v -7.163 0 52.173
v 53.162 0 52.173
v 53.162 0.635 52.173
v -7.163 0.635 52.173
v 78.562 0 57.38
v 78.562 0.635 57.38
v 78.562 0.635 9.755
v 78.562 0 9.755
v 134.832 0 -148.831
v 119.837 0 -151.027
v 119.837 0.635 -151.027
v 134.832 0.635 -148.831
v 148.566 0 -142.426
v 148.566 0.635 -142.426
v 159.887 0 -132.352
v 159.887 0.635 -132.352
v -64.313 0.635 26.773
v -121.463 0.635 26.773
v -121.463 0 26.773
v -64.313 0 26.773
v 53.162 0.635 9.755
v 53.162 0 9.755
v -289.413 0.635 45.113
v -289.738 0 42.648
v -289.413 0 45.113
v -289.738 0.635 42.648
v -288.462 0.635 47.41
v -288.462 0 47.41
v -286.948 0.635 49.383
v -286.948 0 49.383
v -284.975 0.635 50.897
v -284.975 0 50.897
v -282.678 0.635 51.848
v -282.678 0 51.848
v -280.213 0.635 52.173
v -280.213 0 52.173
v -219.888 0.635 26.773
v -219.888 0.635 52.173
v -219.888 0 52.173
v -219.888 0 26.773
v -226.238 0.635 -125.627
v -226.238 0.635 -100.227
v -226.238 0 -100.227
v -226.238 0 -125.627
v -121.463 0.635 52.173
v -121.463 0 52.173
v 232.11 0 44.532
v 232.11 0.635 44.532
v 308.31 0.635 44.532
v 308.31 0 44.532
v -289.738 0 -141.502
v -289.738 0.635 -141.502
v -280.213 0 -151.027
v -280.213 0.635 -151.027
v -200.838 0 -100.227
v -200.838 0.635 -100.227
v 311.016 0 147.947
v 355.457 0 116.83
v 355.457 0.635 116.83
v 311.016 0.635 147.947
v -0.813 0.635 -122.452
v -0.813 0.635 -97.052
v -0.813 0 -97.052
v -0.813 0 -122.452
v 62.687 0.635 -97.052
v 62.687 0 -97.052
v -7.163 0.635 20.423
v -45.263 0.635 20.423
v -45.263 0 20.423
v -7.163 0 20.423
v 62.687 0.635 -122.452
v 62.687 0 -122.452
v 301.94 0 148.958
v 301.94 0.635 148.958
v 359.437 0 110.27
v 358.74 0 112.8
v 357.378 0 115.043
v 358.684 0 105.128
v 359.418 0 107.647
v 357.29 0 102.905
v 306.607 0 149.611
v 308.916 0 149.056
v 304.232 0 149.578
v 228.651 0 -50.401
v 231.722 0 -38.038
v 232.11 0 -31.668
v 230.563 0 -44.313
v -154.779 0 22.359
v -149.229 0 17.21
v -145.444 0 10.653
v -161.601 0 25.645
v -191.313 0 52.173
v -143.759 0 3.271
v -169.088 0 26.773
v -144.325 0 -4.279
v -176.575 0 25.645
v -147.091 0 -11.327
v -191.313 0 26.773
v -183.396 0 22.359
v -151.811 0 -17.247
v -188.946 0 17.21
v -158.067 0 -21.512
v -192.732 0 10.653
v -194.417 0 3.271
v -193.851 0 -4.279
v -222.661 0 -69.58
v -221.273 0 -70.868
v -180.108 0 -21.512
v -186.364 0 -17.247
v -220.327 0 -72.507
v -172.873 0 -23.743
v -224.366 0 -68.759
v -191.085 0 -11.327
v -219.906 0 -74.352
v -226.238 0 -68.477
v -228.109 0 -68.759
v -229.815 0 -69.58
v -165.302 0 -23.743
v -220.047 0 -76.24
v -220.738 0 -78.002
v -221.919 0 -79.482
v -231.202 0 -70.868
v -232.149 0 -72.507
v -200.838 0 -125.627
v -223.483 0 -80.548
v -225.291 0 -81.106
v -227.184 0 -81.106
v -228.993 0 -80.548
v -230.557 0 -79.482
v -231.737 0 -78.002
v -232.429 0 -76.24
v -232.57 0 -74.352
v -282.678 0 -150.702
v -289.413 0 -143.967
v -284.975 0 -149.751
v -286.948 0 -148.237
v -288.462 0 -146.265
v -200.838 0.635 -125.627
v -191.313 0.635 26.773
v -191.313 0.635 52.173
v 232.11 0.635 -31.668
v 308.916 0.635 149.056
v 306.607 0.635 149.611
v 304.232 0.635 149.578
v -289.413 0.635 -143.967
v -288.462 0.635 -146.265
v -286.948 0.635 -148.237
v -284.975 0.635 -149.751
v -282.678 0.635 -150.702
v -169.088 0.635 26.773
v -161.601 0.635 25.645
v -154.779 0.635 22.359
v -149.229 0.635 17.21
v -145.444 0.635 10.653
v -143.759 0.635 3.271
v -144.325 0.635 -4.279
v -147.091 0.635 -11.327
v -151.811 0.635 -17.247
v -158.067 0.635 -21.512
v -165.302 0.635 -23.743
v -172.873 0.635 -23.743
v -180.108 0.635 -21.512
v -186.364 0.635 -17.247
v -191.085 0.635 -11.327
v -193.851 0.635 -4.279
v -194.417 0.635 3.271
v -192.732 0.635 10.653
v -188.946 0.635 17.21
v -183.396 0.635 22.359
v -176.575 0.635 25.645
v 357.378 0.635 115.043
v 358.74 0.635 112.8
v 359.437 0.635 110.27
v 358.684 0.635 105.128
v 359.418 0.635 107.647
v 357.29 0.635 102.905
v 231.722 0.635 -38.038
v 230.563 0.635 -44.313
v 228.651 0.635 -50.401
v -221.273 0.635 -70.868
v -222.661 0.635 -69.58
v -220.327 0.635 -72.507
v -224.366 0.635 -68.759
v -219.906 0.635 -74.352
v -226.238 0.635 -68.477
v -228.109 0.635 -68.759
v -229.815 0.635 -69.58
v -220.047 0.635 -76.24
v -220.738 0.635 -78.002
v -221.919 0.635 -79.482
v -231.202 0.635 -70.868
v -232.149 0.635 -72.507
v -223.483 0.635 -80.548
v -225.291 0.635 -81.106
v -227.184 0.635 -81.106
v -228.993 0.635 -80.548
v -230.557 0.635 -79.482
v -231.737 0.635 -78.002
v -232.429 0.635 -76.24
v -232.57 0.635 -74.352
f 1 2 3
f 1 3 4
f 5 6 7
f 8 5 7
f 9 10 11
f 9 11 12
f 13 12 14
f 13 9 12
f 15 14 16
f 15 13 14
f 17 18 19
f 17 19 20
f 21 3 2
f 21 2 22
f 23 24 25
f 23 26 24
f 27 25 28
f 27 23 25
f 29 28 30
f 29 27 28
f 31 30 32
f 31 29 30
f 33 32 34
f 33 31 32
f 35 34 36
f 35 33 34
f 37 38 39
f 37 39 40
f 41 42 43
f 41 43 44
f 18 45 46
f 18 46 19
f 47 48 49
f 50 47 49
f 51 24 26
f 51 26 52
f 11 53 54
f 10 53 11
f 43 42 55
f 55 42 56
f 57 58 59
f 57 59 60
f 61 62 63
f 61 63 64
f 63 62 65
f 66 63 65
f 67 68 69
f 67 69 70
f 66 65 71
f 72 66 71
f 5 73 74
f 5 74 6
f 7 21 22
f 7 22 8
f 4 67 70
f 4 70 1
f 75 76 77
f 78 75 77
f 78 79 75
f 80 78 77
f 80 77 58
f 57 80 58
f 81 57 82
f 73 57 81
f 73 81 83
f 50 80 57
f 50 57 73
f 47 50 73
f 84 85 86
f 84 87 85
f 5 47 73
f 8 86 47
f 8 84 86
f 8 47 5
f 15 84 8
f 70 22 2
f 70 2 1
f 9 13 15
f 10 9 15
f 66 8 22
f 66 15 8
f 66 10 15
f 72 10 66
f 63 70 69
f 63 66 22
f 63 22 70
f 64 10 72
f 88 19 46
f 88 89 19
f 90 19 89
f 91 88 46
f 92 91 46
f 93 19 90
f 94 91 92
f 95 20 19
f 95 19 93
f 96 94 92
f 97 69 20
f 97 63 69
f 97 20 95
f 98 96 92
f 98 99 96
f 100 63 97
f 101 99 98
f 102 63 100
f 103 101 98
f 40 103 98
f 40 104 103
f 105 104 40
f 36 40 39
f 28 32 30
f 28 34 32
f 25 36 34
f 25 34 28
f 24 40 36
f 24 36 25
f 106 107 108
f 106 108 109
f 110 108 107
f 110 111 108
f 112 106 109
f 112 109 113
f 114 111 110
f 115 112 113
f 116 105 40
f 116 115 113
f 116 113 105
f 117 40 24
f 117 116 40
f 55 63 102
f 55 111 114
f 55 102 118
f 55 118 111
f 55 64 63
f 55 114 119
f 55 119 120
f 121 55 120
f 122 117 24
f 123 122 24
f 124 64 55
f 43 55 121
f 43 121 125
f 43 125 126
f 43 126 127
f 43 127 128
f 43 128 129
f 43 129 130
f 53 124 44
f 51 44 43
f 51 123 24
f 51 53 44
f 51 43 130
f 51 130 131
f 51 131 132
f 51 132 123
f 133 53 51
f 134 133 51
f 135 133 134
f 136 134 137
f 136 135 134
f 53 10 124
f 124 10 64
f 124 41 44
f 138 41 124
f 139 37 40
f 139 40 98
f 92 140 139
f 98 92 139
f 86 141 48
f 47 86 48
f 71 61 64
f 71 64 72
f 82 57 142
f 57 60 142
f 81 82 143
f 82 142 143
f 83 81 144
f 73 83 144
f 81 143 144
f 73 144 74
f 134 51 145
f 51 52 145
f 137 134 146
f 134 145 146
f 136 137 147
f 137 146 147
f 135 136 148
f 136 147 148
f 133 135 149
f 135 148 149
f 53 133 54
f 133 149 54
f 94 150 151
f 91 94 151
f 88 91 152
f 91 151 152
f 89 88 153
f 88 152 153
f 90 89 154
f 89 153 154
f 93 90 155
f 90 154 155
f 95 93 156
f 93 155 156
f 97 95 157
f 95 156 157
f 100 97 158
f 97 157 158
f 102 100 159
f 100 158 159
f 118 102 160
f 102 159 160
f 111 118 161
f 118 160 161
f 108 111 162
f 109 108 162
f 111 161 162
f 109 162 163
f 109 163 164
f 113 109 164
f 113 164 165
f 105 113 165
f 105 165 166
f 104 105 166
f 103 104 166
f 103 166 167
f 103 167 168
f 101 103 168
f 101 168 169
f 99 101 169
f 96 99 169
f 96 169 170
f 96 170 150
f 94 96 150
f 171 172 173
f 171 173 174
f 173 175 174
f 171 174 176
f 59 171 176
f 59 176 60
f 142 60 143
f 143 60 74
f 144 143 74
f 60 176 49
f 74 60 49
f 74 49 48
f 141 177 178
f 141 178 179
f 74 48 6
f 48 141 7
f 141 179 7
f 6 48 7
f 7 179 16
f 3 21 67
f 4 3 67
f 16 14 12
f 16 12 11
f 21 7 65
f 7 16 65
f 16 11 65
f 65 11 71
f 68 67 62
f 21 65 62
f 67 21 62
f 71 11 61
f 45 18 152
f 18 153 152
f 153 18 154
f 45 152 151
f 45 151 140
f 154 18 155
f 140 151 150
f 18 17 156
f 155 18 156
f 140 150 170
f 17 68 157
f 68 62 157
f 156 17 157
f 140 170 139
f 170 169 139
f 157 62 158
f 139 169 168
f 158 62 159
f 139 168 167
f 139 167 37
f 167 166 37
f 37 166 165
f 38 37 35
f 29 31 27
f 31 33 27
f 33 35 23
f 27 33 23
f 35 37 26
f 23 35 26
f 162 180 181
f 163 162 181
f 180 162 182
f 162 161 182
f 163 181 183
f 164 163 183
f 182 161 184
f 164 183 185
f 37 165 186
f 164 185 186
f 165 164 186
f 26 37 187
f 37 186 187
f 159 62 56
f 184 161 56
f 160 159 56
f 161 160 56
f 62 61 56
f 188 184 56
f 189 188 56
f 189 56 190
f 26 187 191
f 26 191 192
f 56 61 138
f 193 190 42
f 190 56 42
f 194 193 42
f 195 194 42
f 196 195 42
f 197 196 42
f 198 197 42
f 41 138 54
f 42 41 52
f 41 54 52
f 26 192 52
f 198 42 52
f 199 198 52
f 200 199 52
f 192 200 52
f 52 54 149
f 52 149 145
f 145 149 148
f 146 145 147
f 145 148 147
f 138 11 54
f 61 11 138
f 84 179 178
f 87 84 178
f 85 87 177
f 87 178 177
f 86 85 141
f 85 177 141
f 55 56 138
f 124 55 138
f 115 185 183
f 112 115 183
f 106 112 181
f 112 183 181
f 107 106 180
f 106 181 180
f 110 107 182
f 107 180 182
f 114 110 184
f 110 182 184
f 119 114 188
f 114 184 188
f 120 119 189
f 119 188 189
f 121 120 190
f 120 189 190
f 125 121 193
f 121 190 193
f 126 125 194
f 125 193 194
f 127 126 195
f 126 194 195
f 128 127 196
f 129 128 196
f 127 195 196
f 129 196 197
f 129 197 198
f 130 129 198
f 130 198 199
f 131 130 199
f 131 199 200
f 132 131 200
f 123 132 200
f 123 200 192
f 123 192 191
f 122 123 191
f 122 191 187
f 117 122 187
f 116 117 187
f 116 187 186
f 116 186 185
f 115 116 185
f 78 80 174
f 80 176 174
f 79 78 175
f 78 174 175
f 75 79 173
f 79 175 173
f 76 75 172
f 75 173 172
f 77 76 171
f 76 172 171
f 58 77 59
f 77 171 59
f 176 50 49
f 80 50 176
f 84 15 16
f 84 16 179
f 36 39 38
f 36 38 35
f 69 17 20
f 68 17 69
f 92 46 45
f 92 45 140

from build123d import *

# Parameters (mm, degrees)
BOSS_EXTRUDE1_DEPTH = 0.635
FILLET1_R           = 9.525
SKETCH2_R           = 25.4
SKETCH2_R_2         = 6.35
SKETCH2_W           = 25.4
SKETCH2_H           = 25.4
SKETCH2_W_2         = 63.5
SKETCH2_H_2         = 47.625
SKETCH2_W_3         = 28.575
CUT_EXTRUDE1_DEPTH  = 390.952780599


with BuildPart() as part:
    # Sketch1 → Boss-Extrude1 (new body)
    with BuildSketch(Plane(origin=(0, 0, 0), x_dir=(1, 0, 0), z_dir=(0, 1, 0))):
        with BuildLine():
            Line((-289.73775964, -52.172972973), (-289.73775964, 151.027027027))
            Line((-289.73775964, 151.027027027), (119.83724036, 151.027027027))
            ThreePointArc((119.83724036, 151.027027027), (141.932070827, 146.12872104), (159.886674172, 132.351669336))
            Line((159.886674172, 132.351669336), (363.971740247, -110.867441355))
            Line((363.971740247, -110.867441355), (306.753969954, -150.931755434))
            Line((306.753969954, -150.931755434), (65.86224036, -52.172972973))
            Line((65.86224036, -52.172972973), (-289.73775964, -52.172972973))
        make_face()
    extrude(amount=BOSS_EXTRUDE1_DEPTH)

    # Fillet1
    fillet1_edges = [part.edges().sort_by_distance(p)[0] for p in [
        (-289.73775964, 0.3175, 52.172972973),
        (-289.73775964, 0.3175, -151.027027027),
        (363.971740247, 0.3175, 110.867441355),
        (306.753969954, 0.3175, 150.931755434),
    ]]
    fillet(fillet1_edges, radius=FILLET1_R)

    # Sketch2 → Cut-Extrude1 (cut, through all)
    with BuildSketch(Plane(origin=(0, 0.635, 0), x_dir=(1, 0, 0), z_dir=(0, 1, 0))):
        with Locations(Location((-169.08775964, -1.372972973, 0), (0, 0, 270))):
            Circle(SKETCH2_R)
        with Locations(Location((-226.23775964, 74.827027027, 0), (0, 0, 270))):
            Circle(SKETCH2_R_2)
        with BuildLine():
            Line((232.109731363, 31.667957705), (232.109731363, -44.532042295))
            Line((232.109731363, -44.532042295), (308.309731363, -44.532042295))
            Line((308.309731363, -44.532042295), (228.651141857, 50.401367929))
            ThreePointArc((228.651141857, 50.401367929), (231.237839047, 41.192957705), (232.109731363, 31.667957705))
        make_face()
        Polygon((-121.46275964, -52.172972973), (-121.46275964, -26.772972973), (-64.31275964, -26.772972973), (-45.26275964, -20.422972973), (-7.16275964, -20.422972973), (-7.16275964, -52.172972973), align=None)
        with Locations((-213.53775964, 112.927027027)):
            Rectangle(SKETCH2_W, SKETCH2_H)
        with Locations((30.93724036, 109.752027027)):
            Rectangle(SKETCH2_W_2, SKETCH2_H)
        with Locations((65.86224036, -33.567113065)):
            Rectangle(SKETCH2_W, SKETCH2_H_2)
        with Locations((-205.60025964, -39.472972973)):
            Rectangle(SKETCH2_W_3, SKETCH2_H)
    extrude(amount=-CUT_EXTRUDE1_DEPTH, mode=Mode.SUBTRACT)


solid = part.part
